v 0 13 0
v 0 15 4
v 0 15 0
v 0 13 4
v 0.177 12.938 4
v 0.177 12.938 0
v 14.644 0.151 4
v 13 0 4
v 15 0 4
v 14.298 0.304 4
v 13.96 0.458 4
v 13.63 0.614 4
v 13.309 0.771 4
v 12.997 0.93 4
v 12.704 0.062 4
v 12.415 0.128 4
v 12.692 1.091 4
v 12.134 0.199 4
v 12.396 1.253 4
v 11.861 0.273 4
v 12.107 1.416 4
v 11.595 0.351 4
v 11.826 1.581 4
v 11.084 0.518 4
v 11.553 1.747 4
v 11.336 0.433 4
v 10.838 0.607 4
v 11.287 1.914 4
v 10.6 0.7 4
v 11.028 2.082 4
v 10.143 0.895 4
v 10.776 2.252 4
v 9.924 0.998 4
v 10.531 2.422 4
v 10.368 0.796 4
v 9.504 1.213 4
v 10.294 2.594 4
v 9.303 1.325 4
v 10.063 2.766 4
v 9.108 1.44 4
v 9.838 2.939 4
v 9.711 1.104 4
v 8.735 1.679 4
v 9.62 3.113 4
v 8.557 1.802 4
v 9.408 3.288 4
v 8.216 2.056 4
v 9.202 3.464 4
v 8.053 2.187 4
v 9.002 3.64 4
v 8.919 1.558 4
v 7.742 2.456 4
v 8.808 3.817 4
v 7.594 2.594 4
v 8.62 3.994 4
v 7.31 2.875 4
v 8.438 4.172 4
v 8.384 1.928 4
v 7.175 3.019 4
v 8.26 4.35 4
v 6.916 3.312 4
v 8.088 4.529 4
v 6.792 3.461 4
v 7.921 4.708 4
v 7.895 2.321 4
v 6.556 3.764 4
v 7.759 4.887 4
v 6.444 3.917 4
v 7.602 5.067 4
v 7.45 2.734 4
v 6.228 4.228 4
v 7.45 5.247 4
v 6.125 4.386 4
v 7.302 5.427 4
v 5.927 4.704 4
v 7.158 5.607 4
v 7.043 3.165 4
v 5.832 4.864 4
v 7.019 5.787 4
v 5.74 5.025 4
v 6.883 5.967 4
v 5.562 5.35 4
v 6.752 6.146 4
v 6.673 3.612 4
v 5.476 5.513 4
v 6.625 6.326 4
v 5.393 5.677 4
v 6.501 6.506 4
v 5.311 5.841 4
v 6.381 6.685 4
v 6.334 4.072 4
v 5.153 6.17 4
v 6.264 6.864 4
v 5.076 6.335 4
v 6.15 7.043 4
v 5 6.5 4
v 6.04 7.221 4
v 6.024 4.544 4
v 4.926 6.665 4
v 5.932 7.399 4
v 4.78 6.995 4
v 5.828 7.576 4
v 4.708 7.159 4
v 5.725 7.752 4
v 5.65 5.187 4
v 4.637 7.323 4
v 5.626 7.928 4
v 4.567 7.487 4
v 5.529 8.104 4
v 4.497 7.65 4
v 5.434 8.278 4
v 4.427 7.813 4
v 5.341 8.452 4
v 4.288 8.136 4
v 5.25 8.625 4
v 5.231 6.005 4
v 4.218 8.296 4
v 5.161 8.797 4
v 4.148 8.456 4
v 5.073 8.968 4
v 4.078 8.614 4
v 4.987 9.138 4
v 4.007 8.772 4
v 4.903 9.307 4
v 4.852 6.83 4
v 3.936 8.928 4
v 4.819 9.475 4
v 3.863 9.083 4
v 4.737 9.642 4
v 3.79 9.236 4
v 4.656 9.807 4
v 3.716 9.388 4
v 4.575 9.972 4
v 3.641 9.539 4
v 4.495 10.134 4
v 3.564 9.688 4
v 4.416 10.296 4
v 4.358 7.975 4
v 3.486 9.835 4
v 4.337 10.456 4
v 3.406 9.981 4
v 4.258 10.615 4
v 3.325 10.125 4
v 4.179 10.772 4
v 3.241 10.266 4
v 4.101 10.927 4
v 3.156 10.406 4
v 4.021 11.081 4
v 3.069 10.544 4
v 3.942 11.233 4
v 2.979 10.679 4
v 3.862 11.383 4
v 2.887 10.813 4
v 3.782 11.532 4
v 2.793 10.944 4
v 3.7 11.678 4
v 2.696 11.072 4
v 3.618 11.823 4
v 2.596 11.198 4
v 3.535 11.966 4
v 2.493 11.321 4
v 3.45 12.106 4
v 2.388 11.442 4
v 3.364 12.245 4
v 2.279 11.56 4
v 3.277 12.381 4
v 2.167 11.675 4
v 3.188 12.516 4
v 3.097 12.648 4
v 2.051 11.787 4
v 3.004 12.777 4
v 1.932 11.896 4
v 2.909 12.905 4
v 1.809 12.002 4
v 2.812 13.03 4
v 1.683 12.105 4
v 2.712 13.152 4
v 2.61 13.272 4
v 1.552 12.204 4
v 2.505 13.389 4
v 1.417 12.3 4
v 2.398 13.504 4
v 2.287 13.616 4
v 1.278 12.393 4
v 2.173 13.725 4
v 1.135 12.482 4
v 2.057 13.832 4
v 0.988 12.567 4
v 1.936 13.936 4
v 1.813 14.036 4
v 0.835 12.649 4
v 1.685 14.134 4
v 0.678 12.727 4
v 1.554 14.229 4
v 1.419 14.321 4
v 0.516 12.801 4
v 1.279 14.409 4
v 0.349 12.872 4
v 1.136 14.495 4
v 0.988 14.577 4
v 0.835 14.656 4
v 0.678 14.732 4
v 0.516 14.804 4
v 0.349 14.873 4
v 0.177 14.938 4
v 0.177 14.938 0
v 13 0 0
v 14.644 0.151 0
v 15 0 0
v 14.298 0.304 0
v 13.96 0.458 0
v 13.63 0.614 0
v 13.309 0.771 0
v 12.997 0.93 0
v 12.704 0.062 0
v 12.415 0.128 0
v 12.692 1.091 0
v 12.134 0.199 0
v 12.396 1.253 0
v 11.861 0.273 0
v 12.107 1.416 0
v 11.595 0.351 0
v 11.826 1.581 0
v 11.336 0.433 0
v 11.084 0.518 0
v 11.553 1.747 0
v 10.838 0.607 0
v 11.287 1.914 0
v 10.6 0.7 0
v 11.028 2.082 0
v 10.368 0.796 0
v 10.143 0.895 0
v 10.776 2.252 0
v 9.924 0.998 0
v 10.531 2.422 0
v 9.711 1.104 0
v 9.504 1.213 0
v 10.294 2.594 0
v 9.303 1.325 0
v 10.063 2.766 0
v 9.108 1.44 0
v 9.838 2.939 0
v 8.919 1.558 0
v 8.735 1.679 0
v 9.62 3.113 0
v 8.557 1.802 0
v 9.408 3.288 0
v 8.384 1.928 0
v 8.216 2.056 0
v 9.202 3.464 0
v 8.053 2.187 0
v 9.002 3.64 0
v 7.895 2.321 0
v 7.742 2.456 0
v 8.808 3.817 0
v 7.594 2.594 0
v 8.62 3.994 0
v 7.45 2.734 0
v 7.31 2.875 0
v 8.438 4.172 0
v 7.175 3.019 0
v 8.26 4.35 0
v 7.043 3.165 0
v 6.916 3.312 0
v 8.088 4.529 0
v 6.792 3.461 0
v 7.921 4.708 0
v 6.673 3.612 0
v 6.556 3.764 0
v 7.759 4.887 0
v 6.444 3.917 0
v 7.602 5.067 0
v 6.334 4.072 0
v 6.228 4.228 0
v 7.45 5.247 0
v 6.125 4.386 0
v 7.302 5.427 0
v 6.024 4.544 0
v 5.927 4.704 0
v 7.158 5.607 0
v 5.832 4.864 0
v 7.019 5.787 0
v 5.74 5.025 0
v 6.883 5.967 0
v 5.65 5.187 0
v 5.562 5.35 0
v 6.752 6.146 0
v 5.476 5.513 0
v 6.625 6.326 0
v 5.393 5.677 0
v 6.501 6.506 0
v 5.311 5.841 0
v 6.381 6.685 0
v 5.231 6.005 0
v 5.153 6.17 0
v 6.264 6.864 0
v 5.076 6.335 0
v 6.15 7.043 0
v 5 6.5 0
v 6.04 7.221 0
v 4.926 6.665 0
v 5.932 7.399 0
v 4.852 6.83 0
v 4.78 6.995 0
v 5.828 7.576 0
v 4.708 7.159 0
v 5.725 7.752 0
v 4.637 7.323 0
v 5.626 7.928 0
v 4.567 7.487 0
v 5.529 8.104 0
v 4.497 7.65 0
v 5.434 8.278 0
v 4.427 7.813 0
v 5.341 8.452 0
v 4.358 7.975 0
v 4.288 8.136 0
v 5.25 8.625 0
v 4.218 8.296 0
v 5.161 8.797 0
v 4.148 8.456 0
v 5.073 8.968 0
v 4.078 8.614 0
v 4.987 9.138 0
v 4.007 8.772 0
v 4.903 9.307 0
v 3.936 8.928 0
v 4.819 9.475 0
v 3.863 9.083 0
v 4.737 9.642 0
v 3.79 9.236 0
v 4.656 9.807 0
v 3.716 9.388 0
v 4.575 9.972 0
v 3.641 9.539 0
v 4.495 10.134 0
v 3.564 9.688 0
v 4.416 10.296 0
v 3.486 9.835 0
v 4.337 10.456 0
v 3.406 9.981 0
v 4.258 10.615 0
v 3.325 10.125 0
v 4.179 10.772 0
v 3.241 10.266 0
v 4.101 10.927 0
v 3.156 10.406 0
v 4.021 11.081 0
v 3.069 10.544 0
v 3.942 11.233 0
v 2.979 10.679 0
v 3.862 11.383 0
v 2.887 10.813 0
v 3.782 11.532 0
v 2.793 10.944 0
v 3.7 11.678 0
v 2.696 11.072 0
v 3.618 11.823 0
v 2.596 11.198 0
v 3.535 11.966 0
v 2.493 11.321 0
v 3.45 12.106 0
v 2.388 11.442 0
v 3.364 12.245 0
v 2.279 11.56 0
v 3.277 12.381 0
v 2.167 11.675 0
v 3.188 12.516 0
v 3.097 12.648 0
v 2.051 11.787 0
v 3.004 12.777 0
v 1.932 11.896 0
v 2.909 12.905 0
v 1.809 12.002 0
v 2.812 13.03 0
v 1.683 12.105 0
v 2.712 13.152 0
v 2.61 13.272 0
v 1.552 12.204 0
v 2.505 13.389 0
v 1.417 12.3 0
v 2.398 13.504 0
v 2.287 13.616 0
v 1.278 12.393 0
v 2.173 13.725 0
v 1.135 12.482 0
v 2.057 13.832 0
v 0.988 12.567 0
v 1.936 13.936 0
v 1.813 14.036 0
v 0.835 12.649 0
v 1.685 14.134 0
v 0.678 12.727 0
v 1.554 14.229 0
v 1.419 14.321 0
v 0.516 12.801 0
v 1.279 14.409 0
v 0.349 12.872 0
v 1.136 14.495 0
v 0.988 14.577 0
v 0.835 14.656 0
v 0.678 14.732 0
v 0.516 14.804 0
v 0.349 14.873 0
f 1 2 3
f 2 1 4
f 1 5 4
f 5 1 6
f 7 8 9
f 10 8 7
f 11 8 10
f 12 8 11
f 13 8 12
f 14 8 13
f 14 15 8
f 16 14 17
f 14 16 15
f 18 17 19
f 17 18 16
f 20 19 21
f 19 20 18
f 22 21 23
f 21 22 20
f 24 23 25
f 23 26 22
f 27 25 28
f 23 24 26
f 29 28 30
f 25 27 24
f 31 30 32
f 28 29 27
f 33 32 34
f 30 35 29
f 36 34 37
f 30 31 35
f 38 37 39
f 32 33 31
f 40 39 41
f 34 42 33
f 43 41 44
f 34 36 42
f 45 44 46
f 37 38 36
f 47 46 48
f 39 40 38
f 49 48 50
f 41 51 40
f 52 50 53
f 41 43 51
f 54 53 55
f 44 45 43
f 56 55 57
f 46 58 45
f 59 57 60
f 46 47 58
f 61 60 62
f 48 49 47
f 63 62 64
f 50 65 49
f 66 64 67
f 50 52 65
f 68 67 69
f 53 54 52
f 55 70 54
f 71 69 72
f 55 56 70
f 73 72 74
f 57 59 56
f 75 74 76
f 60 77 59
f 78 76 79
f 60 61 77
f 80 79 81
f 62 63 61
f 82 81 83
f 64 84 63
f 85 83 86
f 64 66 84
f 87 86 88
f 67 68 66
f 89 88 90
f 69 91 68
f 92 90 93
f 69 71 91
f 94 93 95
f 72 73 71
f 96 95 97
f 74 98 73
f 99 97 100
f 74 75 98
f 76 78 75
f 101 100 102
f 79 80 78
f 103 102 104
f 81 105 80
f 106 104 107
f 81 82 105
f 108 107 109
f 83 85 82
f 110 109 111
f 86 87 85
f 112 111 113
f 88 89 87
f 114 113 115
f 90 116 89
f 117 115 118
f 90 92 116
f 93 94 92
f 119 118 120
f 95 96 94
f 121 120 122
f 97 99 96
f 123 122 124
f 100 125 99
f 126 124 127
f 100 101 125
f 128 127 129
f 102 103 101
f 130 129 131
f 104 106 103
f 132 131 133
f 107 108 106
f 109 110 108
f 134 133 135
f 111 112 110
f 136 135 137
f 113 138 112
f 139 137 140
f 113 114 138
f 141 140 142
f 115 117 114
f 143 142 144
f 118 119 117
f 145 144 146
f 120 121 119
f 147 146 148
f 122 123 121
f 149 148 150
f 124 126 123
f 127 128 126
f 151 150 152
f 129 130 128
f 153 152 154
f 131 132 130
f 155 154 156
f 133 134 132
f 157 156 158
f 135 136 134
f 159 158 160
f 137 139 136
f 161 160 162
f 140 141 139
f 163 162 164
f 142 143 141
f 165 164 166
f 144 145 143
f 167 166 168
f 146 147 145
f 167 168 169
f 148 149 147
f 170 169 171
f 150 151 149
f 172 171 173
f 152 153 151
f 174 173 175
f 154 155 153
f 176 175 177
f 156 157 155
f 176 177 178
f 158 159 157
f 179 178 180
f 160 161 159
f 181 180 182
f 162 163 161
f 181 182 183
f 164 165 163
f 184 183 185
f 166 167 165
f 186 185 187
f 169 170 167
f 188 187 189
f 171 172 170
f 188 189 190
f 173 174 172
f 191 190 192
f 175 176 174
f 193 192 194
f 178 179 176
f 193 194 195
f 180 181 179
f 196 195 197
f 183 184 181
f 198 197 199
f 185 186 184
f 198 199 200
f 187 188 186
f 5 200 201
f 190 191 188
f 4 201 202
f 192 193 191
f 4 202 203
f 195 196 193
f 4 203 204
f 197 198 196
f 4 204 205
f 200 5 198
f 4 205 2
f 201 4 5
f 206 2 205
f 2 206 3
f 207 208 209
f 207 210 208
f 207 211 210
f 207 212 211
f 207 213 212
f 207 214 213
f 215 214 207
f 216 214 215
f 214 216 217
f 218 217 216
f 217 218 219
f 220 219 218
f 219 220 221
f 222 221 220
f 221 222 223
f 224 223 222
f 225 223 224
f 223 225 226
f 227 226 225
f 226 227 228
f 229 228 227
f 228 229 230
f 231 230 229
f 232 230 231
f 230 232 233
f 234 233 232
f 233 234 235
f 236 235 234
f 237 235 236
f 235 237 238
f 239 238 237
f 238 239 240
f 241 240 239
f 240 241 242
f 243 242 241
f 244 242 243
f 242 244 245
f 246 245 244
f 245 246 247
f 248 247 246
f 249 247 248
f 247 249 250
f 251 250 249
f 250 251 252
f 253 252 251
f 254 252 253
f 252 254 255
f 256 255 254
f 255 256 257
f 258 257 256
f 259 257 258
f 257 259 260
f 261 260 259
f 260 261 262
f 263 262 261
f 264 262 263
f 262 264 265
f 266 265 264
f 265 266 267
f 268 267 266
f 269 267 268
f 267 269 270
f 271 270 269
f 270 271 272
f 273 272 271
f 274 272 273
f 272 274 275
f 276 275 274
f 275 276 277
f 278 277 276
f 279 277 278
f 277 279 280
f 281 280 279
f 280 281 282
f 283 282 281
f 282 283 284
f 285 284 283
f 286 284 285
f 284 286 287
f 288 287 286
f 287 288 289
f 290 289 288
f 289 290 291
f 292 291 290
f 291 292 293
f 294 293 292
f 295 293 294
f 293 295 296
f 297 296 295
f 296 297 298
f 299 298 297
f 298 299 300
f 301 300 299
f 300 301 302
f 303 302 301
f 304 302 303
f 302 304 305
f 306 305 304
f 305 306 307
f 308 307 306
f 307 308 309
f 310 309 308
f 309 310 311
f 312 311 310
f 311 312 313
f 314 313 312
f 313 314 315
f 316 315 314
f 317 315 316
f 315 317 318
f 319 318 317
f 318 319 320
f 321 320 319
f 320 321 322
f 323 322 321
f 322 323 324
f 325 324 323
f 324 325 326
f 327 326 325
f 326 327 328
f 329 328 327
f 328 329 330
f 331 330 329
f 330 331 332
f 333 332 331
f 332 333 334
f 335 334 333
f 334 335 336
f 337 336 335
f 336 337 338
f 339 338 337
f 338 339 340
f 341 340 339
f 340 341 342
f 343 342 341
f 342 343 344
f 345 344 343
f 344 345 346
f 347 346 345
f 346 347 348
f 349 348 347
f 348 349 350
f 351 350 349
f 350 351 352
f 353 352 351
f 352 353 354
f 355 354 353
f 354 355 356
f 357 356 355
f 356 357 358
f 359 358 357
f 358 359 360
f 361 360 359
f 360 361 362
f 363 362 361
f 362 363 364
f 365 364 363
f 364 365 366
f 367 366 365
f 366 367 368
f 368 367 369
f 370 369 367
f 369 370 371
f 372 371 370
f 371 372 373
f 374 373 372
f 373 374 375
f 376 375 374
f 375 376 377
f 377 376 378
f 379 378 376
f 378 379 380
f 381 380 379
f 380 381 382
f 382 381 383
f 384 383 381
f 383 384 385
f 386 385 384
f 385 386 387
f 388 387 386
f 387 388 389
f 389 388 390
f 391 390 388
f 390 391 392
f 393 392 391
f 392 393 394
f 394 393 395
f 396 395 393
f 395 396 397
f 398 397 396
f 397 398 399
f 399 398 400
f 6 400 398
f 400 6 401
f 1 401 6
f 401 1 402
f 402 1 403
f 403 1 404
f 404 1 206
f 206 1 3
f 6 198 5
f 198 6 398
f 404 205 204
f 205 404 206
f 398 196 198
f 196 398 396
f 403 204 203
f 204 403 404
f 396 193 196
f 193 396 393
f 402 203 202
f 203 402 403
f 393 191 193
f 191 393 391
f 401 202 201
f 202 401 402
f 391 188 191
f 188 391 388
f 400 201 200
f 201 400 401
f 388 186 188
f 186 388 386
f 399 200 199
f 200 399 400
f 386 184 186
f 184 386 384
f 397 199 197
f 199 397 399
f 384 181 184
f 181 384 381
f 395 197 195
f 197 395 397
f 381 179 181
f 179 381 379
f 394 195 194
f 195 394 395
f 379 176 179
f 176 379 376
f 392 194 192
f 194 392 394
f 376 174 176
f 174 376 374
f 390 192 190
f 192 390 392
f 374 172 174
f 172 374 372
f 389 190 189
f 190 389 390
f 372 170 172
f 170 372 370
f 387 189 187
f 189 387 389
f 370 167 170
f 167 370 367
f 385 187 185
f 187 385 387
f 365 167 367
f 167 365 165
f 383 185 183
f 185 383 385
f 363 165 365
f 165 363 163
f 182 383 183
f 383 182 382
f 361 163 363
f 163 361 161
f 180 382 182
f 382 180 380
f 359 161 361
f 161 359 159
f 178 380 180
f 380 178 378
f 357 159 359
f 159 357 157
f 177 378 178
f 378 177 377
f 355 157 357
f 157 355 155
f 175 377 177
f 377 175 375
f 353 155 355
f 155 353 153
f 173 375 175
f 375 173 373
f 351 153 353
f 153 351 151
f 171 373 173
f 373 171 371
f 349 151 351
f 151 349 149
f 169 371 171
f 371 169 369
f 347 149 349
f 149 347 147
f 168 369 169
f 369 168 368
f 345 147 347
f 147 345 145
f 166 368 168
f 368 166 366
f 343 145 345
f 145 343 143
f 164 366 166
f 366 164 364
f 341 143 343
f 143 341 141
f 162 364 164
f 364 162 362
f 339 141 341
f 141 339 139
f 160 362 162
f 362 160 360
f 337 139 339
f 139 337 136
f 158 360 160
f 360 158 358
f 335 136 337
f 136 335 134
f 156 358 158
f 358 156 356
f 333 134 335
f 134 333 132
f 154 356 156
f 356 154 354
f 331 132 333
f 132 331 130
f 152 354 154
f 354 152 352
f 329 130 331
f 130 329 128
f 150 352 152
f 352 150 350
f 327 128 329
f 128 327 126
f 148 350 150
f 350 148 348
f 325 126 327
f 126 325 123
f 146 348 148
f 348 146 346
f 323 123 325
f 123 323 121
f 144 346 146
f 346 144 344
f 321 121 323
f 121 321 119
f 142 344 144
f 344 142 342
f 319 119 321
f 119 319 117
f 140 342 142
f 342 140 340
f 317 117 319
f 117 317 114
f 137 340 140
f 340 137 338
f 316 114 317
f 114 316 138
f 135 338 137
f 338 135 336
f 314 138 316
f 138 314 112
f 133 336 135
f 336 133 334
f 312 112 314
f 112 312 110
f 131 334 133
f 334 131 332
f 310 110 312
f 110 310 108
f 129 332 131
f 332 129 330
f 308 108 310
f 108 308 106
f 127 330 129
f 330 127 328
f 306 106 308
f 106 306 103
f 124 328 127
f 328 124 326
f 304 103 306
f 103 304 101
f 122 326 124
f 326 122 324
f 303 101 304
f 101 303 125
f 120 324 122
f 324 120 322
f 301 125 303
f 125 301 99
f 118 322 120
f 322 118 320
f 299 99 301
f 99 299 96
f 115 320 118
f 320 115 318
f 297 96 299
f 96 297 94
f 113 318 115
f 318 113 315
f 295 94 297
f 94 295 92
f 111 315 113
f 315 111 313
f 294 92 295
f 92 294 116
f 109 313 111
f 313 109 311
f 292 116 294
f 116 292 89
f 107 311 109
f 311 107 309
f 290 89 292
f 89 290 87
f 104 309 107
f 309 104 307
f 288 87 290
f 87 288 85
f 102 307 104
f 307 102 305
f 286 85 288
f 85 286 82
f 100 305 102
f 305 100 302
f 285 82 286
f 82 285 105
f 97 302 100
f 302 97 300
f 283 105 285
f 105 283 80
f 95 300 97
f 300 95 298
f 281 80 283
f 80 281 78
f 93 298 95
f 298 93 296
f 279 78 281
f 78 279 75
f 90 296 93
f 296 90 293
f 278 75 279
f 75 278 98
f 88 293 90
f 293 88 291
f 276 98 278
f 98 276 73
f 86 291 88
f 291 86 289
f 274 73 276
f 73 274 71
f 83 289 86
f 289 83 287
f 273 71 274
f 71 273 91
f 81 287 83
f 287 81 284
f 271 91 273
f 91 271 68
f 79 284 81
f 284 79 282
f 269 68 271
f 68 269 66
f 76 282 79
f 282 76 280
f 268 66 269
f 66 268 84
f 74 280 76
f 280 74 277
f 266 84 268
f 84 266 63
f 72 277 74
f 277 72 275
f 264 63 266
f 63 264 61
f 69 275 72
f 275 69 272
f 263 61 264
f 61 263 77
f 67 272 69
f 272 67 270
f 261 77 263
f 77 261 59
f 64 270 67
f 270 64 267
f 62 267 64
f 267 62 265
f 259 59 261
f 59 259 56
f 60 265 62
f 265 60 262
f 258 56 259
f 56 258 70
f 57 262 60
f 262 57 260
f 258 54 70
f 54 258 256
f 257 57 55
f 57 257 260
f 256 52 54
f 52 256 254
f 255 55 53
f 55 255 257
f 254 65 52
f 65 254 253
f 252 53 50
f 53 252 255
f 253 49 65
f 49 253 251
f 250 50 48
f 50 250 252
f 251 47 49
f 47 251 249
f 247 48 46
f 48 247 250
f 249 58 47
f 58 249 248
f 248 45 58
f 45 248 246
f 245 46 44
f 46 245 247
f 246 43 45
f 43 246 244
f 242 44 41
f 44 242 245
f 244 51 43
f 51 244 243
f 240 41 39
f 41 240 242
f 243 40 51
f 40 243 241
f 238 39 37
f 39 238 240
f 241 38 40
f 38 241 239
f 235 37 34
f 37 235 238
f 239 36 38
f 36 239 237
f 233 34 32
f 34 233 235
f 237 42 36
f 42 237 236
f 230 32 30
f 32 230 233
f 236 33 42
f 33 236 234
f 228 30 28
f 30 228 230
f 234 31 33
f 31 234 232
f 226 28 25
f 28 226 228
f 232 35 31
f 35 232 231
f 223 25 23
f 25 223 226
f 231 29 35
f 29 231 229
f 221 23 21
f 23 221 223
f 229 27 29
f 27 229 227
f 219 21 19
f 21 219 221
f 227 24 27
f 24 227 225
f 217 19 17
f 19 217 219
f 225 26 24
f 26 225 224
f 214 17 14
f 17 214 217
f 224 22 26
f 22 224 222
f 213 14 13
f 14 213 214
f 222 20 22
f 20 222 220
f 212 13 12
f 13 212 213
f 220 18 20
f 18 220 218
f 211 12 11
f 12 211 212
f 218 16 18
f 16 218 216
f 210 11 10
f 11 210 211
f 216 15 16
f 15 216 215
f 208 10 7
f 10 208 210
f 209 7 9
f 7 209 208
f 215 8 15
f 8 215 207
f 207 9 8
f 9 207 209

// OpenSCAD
joinfactor = 0.125;

gSteps = 100;
gHeight = 4;



BezCubicRibbon([[0,15],[6,13],[3,5],[15,0]], [[0,13],[6,11],[3,2],[13,0]]);


function BEZ03(u) = pow((1-u), 3);
function BEZ13(u) = 3*u*(pow((1-u),2));
function BEZ23(u) = 3*(pow(u,2))*(1-u);
function BEZ33(u) = pow(u,3);

// Calculate a singe point along a cubic bezier curve
function PointOnBezCubic2D(p0, p1, p2, p3, u) = [
	BEZ03(u)*p0[0]+BEZ13(u)*p1[0]+BEZ23(u)*p2[0]+BEZ33(u)*p3[0],
	BEZ03(u)*p0[1]+BEZ13(u)*p1[1]+BEZ23(u)*p2[1]+BEZ33(u)*p3[1]];

function PointOnBezCubic3D(p0, p1, p2, p3, u) = [
	BEZ03(u)*p0[0]+BEZ13(u)*p1[0]+BEZ23(u)*p2[0]+BEZ33(u)*p3[0],
	BEZ03(u)*p0[1]+BEZ13(u)*p1[1]+BEZ23(u)*p2[1]+BEZ33(u)*p3[1],
	BEZ03(u)*p0[2]+BEZ13(u)*p1[2]+BEZ23(u)*p2[2]+BEZ33(u)*p3[2]];

module BezCubicFillet(c, focalPoint, steps=gSteps, height=gHeight)
{
	for(step = [steps:1])
	{
		linear_extrude(height = height, convexity = 10) 
		polygon(
			points=[
				focalPoint,
				PointOnBezCubic2D(c[0], c[1], c[2],c[3], step/steps),
				PointOnBezCubic2D(c[0], c[1], c[2],c[3], (step-1)/steps)],
			paths=[[0,1,2,0]]
		);
	}
}

module BezCubicFilletColored(c, focalPoint, steps=gSteps, height=gHeight, colors)
{
	for(step = [steps:1])
	{
		color(PointOnBezCubic3D(colors[0], colors[1], colors[2], colors[3], step/steps))
		linear_extrude(height = height, convexity = 10) 
		polygon(
			points=[
				focalPoint,
				PointOnBezCubic2D(c[0], c[1], c[2],c[3], step/steps),
				PointOnBezCubic2D(c[0], c[1], c[2],c[3], (step-1)/steps)],
			paths=[[0,1,2,0]]
		);
	}
}


module BezCubicRibbon(c1, c2, steps=gSteps, height=gHeight, colors=[[1,0,0],[1,1,0],[0,1,1],[0,0,1]])
{
	for (step=[0:steps-1])
	{
		color(PointOnBezCubic3D(colors[0], colors[1], colors[2], colors[3], step/steps))
		linear_extrude(height = height, convexity = 10) 
		polygon(
			points=[
				PointOnBezCubic2D(c1[0], c1[1], c1[2],c1[3], step/steps),
				PointOnBezCubic2D(c2[0], c2[1], c2[2],c2[3], (step)/steps),
				PointOnBezCubic2D(c2[0], c2[1], c2[2],c2[3], (step+1)/steps),
				PointOnBezCubic2D(c1[0], c1[1], c1[2],c1[3], (step+1)/steps)],
			paths=[[0,1,2,3]]
		);

	}
}


module DrawCubicControlPoints(c, focalPoint, height)
{
	// Draw control points
	// Start point
	translate(c[0])
	color([1,0,0])
	cylinder(r=0.5, h=height+joinfactor);

	// Controll point 1
	translate(c[1])
	color([0,0,0])
	cylinder(r=0.5, h=height+joinfactor);

	// Control point 2
	translate(c[2])
	color([0,0,0])
	cylinder(r=0.5, h=height+joinfactor);

	// End Point
	translate(c[3])
	color([0,0,1])
	cylinder(r=0.5, h=height+joinfactor);


	// Draw the focal point
	translate(focalPoint)
	color([0,1,0])
	cylinder(r=0.5, h=height+joinfactor);
}

module PlotBEZ0(steps)
{
	cubeSize = 1;
	cubeHeight = steps;

	for (step=[0:steps])
	{
		translate([cubeSize*step, 0, 0])
		cube(size=[cubeSize, cubeSize, BEZ03(step/steps)*cubeHeight]);
	}	
}

module PlotBEZ1(steps)
{
	cubeSize = 1;
	cubeHeight = steps;

	for (step=[0:steps])
	{
		translate([cubeSize*step, 0, 0])
		cube(size=[cubeSize, cubeSize, BEZ13(step/steps)*cubeHeight]);
	}	
}

module PlotBEZ2(steps)
{
	cubeSize = 1;
	cubeHeight = steps;

	for (step=[0:steps])
	{
		translate([cubeSize*step, 0, 0])
		cube(size=[cubeSize, cubeSize, BEZ23(step/steps)*cubeHeight]);
	}	
}

module PlotBEZ3(steps)
{
	cubeSize = 1;
	cubeHeight = steps;

	for (step=[0:steps])
	{
		translate([cubeSize*step, 0, 0])
		cube(size=[cubeSize, cubeSize, BEZ33(step/steps)*cubeHeight]);
	}	
}

module PlotBez4Blending()
{
	sizing = 100;

	translate([0, 0, sizing + 10])
	PlotBEZ0(100);

	translate([sizing+10, 0, sizing + 10])
	PlotBEZ1(100);

	translate([0, 0, 0])
	PlotBEZ2(100);

	translate([sizing+10, 0, 0])
	PlotBEZ3(100);
}
